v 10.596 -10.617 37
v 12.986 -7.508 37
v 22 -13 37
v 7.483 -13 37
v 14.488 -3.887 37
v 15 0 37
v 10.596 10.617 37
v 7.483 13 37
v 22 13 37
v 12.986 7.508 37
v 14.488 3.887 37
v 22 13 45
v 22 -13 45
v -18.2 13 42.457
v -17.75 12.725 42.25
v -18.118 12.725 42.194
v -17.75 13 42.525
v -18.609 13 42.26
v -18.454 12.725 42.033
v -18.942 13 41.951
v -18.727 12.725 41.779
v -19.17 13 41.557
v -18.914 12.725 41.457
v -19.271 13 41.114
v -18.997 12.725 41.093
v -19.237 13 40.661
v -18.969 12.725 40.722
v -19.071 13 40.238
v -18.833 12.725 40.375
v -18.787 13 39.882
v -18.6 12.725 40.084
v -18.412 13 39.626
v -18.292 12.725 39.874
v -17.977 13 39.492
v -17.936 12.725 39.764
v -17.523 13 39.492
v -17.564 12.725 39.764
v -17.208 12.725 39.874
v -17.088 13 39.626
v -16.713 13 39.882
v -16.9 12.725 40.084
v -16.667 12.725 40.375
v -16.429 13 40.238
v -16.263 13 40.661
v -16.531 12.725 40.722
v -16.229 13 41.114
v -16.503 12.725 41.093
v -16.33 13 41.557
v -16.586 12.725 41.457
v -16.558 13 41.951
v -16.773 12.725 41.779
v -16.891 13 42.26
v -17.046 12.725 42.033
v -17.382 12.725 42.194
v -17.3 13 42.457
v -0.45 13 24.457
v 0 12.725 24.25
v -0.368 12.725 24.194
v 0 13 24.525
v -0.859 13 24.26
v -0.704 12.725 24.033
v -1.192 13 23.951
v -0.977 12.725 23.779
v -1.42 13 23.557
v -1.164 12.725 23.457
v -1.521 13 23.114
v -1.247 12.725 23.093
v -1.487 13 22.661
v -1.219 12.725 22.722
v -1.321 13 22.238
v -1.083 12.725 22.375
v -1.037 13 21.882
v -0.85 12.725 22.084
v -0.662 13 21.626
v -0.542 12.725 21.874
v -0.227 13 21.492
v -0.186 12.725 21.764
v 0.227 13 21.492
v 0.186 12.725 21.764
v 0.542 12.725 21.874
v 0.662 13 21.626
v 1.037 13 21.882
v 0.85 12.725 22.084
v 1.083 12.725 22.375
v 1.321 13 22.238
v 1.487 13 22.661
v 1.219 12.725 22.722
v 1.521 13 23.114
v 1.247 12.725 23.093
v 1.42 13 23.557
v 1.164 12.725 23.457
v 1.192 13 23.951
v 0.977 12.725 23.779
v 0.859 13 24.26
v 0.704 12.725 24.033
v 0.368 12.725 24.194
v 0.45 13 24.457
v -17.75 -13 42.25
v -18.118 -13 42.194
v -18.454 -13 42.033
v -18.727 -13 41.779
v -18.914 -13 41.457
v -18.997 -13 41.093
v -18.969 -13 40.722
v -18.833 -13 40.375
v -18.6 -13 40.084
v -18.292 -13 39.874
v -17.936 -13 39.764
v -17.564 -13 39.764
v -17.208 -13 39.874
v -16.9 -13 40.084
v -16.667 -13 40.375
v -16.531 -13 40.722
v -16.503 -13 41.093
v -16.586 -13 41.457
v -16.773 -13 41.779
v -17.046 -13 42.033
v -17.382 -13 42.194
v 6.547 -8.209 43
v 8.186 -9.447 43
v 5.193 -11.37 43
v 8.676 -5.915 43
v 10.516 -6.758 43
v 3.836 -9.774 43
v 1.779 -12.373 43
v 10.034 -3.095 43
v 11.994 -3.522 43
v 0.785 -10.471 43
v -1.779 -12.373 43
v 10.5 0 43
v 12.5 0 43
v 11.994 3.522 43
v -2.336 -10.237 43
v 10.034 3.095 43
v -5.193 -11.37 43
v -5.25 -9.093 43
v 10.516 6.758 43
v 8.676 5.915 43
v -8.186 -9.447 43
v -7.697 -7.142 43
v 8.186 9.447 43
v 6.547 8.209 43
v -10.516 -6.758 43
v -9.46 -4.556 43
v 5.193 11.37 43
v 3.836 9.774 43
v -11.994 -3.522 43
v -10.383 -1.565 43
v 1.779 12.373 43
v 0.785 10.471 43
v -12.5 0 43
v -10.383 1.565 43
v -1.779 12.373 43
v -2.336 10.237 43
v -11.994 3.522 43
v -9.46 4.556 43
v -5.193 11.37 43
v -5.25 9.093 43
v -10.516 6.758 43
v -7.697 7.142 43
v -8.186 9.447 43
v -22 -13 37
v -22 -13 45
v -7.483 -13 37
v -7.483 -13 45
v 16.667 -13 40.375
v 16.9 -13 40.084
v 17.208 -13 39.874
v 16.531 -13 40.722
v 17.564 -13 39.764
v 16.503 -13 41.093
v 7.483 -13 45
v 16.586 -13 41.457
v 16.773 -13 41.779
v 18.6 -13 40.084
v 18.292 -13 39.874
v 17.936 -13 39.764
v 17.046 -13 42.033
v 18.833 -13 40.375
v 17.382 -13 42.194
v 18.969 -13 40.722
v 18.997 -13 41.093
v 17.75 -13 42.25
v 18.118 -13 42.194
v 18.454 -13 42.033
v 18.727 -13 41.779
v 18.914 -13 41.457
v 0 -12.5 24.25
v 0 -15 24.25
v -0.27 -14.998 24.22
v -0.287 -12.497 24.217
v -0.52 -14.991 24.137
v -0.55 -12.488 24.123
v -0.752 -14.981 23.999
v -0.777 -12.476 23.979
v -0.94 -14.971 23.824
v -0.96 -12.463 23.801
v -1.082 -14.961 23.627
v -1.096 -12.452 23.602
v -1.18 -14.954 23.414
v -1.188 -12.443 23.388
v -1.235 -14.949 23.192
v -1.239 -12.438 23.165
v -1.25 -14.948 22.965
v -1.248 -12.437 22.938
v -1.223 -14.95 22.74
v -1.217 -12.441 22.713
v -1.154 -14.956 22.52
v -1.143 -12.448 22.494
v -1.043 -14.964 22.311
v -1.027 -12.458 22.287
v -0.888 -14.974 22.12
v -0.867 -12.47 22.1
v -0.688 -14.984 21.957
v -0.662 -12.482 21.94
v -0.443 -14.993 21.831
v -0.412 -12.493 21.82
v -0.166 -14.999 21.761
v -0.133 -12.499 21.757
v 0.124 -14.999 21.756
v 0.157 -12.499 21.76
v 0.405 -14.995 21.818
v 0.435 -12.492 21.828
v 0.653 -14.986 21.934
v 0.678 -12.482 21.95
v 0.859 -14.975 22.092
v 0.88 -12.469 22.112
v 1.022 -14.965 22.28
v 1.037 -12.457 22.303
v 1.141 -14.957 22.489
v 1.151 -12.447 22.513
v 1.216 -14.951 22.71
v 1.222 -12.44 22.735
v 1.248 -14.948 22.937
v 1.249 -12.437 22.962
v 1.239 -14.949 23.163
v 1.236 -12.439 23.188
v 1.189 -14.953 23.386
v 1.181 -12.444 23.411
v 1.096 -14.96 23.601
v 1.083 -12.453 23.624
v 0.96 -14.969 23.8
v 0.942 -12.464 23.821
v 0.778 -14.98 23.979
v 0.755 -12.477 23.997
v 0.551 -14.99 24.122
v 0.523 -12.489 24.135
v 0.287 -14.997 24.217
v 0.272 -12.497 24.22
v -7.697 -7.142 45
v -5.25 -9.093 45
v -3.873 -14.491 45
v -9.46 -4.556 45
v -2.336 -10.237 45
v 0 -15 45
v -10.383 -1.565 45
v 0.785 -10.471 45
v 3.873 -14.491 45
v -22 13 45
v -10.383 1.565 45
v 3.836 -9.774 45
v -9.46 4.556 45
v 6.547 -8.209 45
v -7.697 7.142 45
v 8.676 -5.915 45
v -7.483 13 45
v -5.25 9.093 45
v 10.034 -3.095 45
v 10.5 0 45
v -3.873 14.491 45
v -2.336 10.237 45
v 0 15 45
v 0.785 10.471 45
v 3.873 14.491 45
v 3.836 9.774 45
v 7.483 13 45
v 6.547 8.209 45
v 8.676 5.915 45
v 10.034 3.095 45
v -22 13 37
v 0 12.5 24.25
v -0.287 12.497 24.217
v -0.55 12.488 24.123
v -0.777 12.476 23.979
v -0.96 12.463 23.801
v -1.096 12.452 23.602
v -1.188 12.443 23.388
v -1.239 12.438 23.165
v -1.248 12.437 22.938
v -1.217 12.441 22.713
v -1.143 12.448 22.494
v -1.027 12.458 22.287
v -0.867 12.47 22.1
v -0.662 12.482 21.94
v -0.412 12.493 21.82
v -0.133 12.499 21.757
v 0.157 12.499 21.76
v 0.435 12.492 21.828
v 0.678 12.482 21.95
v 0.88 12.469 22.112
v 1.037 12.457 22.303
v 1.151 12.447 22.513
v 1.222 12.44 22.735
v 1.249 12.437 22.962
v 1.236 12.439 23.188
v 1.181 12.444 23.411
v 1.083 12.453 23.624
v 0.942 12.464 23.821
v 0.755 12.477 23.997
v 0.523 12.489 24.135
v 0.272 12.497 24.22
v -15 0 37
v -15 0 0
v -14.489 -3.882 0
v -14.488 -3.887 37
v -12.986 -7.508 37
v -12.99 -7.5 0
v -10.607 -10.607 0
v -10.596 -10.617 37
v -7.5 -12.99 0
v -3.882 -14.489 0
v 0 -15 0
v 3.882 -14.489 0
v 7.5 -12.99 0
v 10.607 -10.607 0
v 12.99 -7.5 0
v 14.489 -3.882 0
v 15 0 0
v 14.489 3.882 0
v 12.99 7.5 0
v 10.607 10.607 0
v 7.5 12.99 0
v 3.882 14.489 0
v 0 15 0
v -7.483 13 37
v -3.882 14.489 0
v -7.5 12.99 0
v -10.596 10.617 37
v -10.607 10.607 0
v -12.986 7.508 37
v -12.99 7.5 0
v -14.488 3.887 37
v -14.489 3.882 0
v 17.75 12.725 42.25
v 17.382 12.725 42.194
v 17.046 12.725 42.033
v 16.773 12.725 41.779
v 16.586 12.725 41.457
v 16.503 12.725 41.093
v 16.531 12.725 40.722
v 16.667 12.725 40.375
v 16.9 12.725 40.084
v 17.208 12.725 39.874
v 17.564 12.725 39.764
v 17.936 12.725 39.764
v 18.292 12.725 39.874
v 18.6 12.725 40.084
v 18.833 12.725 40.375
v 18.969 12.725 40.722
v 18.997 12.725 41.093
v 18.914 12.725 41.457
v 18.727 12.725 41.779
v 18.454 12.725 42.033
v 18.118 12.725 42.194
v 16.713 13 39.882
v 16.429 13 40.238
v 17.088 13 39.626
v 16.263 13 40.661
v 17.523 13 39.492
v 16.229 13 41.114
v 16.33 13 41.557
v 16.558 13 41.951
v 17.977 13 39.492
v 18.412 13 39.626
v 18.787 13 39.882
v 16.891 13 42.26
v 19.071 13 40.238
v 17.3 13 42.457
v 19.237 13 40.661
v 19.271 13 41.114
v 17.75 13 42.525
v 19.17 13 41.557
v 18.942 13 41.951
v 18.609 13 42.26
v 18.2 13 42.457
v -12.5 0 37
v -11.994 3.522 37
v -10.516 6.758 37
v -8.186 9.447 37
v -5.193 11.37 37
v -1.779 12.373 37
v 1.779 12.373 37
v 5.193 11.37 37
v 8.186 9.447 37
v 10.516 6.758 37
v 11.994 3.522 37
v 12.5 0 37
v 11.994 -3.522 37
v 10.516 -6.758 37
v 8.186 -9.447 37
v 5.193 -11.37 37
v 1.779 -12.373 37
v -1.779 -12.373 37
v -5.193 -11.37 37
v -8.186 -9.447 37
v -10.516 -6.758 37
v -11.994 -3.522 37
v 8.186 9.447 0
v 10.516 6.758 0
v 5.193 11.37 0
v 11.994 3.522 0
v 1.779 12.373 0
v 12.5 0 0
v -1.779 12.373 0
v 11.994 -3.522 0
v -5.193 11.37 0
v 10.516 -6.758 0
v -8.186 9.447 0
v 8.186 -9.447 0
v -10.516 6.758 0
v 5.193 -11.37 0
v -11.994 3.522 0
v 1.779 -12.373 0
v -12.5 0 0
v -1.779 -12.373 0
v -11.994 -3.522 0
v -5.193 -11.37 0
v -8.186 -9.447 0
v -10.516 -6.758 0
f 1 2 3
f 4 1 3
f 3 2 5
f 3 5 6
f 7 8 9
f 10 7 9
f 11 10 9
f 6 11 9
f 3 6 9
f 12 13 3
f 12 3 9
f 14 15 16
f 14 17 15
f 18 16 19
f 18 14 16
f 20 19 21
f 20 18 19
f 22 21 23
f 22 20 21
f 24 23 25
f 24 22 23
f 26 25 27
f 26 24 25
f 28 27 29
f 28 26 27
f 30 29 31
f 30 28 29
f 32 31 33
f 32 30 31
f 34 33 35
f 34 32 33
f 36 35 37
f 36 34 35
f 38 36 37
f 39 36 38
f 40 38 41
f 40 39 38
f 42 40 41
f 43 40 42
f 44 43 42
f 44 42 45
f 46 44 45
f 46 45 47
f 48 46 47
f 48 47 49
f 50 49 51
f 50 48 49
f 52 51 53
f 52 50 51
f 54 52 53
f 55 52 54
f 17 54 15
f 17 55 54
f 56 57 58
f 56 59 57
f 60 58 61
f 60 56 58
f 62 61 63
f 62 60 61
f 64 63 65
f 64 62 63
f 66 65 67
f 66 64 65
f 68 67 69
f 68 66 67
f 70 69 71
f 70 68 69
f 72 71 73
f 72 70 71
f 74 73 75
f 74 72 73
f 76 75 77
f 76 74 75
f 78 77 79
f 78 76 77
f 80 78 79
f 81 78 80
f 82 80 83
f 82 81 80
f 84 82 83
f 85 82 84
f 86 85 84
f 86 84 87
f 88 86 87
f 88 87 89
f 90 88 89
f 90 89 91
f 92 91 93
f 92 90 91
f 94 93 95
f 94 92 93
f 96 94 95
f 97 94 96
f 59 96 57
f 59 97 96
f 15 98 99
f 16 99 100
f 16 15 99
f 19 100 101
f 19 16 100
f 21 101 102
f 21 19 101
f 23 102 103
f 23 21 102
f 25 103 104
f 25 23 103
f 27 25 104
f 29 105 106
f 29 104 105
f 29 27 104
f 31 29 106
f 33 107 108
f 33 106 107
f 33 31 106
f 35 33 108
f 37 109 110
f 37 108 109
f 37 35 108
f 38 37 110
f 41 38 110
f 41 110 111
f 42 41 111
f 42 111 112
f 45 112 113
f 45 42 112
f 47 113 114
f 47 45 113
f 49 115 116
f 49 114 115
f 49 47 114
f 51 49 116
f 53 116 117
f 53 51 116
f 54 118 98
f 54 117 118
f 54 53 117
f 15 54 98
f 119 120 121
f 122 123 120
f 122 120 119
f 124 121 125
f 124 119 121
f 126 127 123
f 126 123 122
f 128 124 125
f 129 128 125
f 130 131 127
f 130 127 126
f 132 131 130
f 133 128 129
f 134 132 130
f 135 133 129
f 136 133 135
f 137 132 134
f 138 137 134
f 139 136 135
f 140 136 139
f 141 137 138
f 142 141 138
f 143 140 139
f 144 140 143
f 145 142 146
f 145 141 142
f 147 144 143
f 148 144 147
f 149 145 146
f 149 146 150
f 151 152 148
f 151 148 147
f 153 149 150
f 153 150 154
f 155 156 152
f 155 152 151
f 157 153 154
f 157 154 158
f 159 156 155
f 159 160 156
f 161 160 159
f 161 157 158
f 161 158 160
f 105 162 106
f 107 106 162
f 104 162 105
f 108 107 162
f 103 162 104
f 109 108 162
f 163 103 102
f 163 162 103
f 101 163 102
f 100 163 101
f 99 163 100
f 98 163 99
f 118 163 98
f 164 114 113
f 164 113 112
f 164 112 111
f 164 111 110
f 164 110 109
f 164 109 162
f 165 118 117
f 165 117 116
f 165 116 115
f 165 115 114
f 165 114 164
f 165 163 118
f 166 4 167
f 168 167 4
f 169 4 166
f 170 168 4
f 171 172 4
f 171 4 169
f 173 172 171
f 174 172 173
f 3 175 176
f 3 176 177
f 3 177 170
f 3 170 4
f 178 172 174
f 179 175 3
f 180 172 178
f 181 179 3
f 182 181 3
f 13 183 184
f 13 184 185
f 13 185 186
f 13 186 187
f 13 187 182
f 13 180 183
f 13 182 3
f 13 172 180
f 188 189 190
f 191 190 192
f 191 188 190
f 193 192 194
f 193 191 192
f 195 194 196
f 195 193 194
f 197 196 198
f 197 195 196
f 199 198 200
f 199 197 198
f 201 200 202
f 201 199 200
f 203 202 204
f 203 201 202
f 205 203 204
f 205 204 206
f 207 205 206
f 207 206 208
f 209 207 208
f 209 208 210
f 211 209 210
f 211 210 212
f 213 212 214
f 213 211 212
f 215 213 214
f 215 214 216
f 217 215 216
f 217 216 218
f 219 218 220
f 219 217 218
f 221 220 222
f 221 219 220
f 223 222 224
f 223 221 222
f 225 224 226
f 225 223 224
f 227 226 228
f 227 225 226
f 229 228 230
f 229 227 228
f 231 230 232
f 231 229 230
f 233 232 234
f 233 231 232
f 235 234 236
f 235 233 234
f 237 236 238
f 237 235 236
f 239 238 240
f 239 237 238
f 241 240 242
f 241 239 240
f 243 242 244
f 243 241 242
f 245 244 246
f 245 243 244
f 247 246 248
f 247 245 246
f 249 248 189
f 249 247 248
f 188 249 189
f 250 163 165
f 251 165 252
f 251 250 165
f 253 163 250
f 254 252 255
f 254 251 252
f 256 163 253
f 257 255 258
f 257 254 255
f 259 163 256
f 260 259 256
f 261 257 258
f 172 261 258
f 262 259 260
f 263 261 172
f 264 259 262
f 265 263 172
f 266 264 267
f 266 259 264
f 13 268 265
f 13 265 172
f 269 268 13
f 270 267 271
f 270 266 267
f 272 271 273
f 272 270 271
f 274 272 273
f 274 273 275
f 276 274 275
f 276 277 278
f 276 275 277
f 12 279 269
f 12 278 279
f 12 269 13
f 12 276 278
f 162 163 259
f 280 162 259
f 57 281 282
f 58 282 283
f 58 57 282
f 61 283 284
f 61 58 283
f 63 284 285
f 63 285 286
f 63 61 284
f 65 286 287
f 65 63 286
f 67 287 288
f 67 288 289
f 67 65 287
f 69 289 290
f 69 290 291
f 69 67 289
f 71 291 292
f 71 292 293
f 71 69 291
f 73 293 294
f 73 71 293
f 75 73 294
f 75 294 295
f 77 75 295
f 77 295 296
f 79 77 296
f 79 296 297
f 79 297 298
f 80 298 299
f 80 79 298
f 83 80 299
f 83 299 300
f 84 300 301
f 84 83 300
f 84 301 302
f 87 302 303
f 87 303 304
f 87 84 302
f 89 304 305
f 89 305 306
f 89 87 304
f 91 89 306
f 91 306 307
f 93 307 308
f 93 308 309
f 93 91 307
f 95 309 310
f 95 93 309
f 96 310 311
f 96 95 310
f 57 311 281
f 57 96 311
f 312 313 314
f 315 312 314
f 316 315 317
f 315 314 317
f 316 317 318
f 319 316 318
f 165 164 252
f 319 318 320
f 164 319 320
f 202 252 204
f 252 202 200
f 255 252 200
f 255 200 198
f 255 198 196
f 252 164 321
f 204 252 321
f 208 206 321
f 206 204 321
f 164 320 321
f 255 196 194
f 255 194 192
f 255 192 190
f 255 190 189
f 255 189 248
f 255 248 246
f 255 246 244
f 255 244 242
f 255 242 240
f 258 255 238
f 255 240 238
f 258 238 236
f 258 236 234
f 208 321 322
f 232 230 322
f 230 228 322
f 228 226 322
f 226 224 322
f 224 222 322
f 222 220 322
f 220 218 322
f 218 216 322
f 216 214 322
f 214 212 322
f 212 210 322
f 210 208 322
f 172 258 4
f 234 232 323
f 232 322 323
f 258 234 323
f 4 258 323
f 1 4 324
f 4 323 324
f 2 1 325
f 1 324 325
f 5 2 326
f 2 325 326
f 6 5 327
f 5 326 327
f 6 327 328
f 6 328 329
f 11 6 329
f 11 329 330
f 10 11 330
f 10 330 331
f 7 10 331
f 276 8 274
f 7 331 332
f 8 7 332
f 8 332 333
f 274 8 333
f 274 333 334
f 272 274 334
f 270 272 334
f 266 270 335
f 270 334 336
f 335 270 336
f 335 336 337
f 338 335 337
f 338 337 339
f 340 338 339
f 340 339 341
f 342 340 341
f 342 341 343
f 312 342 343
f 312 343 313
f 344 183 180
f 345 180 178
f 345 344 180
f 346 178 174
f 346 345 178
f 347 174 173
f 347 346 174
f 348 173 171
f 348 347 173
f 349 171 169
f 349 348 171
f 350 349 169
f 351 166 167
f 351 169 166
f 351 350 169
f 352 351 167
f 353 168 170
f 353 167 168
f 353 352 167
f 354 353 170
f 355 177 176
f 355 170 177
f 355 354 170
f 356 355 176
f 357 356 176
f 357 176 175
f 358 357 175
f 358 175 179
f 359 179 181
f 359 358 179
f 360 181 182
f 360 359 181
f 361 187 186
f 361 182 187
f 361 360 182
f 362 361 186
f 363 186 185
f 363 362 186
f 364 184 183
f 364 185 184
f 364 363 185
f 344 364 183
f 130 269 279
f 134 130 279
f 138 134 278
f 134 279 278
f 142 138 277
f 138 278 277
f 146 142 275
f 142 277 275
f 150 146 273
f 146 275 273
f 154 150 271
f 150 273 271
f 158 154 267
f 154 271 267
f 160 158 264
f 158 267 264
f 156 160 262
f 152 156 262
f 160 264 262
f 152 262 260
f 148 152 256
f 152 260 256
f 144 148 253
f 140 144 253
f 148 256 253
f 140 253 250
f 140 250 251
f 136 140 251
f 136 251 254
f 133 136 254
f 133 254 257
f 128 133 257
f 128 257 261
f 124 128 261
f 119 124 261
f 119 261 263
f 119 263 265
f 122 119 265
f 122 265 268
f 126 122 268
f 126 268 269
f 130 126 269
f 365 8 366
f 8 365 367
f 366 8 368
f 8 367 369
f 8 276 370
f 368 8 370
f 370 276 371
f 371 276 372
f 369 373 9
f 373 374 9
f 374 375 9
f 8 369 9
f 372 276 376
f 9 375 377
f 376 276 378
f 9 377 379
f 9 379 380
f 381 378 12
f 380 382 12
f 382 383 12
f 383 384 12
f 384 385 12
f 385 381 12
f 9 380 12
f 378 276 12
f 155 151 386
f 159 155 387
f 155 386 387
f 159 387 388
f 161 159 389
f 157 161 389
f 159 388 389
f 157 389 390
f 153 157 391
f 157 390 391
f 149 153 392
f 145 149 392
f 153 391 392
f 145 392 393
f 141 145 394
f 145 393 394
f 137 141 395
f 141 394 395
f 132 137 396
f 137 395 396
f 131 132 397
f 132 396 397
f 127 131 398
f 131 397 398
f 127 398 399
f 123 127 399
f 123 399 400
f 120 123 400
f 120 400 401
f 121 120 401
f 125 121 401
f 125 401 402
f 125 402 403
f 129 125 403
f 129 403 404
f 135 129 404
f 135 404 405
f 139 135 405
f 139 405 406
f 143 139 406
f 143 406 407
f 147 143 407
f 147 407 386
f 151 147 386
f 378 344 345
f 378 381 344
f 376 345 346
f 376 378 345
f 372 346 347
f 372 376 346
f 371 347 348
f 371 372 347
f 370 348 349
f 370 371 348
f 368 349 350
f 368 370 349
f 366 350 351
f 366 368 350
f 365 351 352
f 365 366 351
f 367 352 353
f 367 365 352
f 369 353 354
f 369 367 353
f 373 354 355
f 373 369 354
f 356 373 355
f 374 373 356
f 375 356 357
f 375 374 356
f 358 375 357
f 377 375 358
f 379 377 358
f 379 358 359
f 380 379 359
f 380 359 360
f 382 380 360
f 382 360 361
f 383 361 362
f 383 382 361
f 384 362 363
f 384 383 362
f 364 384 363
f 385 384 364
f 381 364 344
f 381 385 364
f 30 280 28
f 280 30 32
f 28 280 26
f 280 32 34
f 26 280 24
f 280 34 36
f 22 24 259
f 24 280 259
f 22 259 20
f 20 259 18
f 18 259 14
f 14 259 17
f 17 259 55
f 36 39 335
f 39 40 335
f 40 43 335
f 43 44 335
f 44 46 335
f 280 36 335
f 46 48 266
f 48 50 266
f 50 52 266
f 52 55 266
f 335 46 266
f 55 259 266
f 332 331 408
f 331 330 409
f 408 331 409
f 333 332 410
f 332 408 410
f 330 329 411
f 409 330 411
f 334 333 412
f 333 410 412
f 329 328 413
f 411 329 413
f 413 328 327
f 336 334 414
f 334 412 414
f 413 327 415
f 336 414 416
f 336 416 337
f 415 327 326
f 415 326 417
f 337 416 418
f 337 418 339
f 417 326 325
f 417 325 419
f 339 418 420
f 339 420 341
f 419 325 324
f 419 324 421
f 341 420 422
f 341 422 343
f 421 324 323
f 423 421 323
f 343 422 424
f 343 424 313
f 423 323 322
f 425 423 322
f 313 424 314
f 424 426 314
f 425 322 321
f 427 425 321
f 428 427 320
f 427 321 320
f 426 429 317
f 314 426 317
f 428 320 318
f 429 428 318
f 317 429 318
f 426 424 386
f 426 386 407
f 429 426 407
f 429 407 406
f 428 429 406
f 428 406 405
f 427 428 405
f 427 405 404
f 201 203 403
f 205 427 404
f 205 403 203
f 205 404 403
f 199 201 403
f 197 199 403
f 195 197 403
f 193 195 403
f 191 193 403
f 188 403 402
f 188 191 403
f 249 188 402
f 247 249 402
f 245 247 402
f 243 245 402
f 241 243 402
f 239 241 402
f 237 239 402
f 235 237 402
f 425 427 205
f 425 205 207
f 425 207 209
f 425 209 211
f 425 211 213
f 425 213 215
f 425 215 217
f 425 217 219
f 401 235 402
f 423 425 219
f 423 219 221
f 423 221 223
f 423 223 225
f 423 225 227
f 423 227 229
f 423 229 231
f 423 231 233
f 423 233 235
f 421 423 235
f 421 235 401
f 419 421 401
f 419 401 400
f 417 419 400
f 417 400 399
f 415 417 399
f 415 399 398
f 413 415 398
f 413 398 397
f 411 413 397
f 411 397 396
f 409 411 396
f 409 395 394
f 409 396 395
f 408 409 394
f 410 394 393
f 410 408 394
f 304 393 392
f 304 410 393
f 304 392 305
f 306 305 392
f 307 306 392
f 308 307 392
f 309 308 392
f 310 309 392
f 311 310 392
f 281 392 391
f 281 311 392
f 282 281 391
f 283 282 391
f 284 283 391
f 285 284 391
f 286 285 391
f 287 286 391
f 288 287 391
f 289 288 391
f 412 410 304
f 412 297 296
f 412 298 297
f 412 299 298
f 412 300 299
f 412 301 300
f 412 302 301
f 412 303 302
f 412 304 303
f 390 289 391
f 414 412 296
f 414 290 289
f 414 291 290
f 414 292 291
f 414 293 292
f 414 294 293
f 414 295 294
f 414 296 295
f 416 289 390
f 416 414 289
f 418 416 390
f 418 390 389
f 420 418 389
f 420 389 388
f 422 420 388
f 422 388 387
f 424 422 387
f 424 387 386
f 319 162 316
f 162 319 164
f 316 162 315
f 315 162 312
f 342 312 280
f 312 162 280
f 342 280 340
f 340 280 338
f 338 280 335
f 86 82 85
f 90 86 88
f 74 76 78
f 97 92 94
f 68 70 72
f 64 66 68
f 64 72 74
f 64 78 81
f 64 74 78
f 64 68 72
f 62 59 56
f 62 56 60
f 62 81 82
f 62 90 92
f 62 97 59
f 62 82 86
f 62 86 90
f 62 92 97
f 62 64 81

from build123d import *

# Parameters (mm, degrees)
SKETCH_1_R                  = 15
SKETCH_1_R_2                = 12.5
EXTRUDE_1_DEPTH             = 45
SKETCH_2_W                  = 44
SKETCH_2_H                  = 26
SKETCH_2_R                  = 10.5
EXTRUDE_2_DEPTH             = 8
HOLE_WIZARD_M3_1_AT_2_COUNT = 2
HOLE_WIZARD_M3_1_AT_2_PITCH = 35.5
HOLE_WIZARD_M3_1_AT_3_COUNT = 2
HOLE_WIZARD_M3_1_AT_3_PITCH = 25.27968552
SKETCH_6_R                  = 12.5
CUT_EXTRUDE_1_DEPTH         = 43


with BuildPart() as part:
    # 草图1 → 凸台-拉伸1 (new body)
    with BuildSketch(Plane.XY):
        with Locations(Location((0, 0, 0), (0, 0, 180))):
            Circle(SKETCH_1_R)
        with Locations(Location((0, 0, 0), (0, 0, 180))):
            Circle(SKETCH_1_R_2, mode=Mode.SUBTRACT)
    extrude(amount=EXTRUDE_1_DEPTH)

    # 草图2 → 凸台-拉伸2 (add)
    with BuildSketch(Plane.XY.offset(45)):
        Rectangle(SKETCH_2_W, SKETCH_2_H)
        Circle(SKETCH_2_R, mode=Mode.SUBTRACT)
    extrude(amount=-EXTRUDE_2_DEPTH)

    # 草图5 → M3 螺纹孔1 (revolve, cut)
    with BuildSketch(Plane(origin=(-17.75, 13, 41), x_dir=(0, 0, 1), z_dir=(1, 0, 0))):
        Polygon((0, 0), (0, 28), (1.25, 28), (1.25, 0.275), (1.525, 0), align=None)
    hole_wizard_m3_1 = revolve(axis=Axis((-17.75, 19.35, 41), (0, -1, 0)), mode=Mode.SUBTRACT)

    # M3 螺纹孔1 at 2: M3 螺纹孔1 ×2
    with Locations(*[(i * HOLE_WIZARD_M3_1_AT_2_PITCH, 0, 0) for i in range(1, HOLE_WIZARD_M3_1_AT_2_COUNT)]):
        add(hole_wizard_m3_1, mode=Mode.SUBTRACT)

    # M3 螺纹孔1 at 3: M3 螺纹孔1 ×2
    with Locations(*[Vector(0.7021448105364914, 0, -0.7120341740651741) * (i * HOLE_WIZARD_M3_1_AT_3_PITCH) for i in range(1, HOLE_WIZARD_M3_1_AT_3_COUNT)]):
        add(hole_wizard_m3_1, mode=Mode.SUBTRACT)

    # 草图6 → 切除-拉伸1 (cut)
    with BuildSketch(Plane(origin=(0, 0, 0), x_dir=(-1, 0, 0), z_dir=(0, 0, -1))):
        Circle(SKETCH_6_R)
    extrude(amount=-CUT_EXTRUDE_1_DEPTH, mode=Mode.SUBTRACT)


solid = part.part
